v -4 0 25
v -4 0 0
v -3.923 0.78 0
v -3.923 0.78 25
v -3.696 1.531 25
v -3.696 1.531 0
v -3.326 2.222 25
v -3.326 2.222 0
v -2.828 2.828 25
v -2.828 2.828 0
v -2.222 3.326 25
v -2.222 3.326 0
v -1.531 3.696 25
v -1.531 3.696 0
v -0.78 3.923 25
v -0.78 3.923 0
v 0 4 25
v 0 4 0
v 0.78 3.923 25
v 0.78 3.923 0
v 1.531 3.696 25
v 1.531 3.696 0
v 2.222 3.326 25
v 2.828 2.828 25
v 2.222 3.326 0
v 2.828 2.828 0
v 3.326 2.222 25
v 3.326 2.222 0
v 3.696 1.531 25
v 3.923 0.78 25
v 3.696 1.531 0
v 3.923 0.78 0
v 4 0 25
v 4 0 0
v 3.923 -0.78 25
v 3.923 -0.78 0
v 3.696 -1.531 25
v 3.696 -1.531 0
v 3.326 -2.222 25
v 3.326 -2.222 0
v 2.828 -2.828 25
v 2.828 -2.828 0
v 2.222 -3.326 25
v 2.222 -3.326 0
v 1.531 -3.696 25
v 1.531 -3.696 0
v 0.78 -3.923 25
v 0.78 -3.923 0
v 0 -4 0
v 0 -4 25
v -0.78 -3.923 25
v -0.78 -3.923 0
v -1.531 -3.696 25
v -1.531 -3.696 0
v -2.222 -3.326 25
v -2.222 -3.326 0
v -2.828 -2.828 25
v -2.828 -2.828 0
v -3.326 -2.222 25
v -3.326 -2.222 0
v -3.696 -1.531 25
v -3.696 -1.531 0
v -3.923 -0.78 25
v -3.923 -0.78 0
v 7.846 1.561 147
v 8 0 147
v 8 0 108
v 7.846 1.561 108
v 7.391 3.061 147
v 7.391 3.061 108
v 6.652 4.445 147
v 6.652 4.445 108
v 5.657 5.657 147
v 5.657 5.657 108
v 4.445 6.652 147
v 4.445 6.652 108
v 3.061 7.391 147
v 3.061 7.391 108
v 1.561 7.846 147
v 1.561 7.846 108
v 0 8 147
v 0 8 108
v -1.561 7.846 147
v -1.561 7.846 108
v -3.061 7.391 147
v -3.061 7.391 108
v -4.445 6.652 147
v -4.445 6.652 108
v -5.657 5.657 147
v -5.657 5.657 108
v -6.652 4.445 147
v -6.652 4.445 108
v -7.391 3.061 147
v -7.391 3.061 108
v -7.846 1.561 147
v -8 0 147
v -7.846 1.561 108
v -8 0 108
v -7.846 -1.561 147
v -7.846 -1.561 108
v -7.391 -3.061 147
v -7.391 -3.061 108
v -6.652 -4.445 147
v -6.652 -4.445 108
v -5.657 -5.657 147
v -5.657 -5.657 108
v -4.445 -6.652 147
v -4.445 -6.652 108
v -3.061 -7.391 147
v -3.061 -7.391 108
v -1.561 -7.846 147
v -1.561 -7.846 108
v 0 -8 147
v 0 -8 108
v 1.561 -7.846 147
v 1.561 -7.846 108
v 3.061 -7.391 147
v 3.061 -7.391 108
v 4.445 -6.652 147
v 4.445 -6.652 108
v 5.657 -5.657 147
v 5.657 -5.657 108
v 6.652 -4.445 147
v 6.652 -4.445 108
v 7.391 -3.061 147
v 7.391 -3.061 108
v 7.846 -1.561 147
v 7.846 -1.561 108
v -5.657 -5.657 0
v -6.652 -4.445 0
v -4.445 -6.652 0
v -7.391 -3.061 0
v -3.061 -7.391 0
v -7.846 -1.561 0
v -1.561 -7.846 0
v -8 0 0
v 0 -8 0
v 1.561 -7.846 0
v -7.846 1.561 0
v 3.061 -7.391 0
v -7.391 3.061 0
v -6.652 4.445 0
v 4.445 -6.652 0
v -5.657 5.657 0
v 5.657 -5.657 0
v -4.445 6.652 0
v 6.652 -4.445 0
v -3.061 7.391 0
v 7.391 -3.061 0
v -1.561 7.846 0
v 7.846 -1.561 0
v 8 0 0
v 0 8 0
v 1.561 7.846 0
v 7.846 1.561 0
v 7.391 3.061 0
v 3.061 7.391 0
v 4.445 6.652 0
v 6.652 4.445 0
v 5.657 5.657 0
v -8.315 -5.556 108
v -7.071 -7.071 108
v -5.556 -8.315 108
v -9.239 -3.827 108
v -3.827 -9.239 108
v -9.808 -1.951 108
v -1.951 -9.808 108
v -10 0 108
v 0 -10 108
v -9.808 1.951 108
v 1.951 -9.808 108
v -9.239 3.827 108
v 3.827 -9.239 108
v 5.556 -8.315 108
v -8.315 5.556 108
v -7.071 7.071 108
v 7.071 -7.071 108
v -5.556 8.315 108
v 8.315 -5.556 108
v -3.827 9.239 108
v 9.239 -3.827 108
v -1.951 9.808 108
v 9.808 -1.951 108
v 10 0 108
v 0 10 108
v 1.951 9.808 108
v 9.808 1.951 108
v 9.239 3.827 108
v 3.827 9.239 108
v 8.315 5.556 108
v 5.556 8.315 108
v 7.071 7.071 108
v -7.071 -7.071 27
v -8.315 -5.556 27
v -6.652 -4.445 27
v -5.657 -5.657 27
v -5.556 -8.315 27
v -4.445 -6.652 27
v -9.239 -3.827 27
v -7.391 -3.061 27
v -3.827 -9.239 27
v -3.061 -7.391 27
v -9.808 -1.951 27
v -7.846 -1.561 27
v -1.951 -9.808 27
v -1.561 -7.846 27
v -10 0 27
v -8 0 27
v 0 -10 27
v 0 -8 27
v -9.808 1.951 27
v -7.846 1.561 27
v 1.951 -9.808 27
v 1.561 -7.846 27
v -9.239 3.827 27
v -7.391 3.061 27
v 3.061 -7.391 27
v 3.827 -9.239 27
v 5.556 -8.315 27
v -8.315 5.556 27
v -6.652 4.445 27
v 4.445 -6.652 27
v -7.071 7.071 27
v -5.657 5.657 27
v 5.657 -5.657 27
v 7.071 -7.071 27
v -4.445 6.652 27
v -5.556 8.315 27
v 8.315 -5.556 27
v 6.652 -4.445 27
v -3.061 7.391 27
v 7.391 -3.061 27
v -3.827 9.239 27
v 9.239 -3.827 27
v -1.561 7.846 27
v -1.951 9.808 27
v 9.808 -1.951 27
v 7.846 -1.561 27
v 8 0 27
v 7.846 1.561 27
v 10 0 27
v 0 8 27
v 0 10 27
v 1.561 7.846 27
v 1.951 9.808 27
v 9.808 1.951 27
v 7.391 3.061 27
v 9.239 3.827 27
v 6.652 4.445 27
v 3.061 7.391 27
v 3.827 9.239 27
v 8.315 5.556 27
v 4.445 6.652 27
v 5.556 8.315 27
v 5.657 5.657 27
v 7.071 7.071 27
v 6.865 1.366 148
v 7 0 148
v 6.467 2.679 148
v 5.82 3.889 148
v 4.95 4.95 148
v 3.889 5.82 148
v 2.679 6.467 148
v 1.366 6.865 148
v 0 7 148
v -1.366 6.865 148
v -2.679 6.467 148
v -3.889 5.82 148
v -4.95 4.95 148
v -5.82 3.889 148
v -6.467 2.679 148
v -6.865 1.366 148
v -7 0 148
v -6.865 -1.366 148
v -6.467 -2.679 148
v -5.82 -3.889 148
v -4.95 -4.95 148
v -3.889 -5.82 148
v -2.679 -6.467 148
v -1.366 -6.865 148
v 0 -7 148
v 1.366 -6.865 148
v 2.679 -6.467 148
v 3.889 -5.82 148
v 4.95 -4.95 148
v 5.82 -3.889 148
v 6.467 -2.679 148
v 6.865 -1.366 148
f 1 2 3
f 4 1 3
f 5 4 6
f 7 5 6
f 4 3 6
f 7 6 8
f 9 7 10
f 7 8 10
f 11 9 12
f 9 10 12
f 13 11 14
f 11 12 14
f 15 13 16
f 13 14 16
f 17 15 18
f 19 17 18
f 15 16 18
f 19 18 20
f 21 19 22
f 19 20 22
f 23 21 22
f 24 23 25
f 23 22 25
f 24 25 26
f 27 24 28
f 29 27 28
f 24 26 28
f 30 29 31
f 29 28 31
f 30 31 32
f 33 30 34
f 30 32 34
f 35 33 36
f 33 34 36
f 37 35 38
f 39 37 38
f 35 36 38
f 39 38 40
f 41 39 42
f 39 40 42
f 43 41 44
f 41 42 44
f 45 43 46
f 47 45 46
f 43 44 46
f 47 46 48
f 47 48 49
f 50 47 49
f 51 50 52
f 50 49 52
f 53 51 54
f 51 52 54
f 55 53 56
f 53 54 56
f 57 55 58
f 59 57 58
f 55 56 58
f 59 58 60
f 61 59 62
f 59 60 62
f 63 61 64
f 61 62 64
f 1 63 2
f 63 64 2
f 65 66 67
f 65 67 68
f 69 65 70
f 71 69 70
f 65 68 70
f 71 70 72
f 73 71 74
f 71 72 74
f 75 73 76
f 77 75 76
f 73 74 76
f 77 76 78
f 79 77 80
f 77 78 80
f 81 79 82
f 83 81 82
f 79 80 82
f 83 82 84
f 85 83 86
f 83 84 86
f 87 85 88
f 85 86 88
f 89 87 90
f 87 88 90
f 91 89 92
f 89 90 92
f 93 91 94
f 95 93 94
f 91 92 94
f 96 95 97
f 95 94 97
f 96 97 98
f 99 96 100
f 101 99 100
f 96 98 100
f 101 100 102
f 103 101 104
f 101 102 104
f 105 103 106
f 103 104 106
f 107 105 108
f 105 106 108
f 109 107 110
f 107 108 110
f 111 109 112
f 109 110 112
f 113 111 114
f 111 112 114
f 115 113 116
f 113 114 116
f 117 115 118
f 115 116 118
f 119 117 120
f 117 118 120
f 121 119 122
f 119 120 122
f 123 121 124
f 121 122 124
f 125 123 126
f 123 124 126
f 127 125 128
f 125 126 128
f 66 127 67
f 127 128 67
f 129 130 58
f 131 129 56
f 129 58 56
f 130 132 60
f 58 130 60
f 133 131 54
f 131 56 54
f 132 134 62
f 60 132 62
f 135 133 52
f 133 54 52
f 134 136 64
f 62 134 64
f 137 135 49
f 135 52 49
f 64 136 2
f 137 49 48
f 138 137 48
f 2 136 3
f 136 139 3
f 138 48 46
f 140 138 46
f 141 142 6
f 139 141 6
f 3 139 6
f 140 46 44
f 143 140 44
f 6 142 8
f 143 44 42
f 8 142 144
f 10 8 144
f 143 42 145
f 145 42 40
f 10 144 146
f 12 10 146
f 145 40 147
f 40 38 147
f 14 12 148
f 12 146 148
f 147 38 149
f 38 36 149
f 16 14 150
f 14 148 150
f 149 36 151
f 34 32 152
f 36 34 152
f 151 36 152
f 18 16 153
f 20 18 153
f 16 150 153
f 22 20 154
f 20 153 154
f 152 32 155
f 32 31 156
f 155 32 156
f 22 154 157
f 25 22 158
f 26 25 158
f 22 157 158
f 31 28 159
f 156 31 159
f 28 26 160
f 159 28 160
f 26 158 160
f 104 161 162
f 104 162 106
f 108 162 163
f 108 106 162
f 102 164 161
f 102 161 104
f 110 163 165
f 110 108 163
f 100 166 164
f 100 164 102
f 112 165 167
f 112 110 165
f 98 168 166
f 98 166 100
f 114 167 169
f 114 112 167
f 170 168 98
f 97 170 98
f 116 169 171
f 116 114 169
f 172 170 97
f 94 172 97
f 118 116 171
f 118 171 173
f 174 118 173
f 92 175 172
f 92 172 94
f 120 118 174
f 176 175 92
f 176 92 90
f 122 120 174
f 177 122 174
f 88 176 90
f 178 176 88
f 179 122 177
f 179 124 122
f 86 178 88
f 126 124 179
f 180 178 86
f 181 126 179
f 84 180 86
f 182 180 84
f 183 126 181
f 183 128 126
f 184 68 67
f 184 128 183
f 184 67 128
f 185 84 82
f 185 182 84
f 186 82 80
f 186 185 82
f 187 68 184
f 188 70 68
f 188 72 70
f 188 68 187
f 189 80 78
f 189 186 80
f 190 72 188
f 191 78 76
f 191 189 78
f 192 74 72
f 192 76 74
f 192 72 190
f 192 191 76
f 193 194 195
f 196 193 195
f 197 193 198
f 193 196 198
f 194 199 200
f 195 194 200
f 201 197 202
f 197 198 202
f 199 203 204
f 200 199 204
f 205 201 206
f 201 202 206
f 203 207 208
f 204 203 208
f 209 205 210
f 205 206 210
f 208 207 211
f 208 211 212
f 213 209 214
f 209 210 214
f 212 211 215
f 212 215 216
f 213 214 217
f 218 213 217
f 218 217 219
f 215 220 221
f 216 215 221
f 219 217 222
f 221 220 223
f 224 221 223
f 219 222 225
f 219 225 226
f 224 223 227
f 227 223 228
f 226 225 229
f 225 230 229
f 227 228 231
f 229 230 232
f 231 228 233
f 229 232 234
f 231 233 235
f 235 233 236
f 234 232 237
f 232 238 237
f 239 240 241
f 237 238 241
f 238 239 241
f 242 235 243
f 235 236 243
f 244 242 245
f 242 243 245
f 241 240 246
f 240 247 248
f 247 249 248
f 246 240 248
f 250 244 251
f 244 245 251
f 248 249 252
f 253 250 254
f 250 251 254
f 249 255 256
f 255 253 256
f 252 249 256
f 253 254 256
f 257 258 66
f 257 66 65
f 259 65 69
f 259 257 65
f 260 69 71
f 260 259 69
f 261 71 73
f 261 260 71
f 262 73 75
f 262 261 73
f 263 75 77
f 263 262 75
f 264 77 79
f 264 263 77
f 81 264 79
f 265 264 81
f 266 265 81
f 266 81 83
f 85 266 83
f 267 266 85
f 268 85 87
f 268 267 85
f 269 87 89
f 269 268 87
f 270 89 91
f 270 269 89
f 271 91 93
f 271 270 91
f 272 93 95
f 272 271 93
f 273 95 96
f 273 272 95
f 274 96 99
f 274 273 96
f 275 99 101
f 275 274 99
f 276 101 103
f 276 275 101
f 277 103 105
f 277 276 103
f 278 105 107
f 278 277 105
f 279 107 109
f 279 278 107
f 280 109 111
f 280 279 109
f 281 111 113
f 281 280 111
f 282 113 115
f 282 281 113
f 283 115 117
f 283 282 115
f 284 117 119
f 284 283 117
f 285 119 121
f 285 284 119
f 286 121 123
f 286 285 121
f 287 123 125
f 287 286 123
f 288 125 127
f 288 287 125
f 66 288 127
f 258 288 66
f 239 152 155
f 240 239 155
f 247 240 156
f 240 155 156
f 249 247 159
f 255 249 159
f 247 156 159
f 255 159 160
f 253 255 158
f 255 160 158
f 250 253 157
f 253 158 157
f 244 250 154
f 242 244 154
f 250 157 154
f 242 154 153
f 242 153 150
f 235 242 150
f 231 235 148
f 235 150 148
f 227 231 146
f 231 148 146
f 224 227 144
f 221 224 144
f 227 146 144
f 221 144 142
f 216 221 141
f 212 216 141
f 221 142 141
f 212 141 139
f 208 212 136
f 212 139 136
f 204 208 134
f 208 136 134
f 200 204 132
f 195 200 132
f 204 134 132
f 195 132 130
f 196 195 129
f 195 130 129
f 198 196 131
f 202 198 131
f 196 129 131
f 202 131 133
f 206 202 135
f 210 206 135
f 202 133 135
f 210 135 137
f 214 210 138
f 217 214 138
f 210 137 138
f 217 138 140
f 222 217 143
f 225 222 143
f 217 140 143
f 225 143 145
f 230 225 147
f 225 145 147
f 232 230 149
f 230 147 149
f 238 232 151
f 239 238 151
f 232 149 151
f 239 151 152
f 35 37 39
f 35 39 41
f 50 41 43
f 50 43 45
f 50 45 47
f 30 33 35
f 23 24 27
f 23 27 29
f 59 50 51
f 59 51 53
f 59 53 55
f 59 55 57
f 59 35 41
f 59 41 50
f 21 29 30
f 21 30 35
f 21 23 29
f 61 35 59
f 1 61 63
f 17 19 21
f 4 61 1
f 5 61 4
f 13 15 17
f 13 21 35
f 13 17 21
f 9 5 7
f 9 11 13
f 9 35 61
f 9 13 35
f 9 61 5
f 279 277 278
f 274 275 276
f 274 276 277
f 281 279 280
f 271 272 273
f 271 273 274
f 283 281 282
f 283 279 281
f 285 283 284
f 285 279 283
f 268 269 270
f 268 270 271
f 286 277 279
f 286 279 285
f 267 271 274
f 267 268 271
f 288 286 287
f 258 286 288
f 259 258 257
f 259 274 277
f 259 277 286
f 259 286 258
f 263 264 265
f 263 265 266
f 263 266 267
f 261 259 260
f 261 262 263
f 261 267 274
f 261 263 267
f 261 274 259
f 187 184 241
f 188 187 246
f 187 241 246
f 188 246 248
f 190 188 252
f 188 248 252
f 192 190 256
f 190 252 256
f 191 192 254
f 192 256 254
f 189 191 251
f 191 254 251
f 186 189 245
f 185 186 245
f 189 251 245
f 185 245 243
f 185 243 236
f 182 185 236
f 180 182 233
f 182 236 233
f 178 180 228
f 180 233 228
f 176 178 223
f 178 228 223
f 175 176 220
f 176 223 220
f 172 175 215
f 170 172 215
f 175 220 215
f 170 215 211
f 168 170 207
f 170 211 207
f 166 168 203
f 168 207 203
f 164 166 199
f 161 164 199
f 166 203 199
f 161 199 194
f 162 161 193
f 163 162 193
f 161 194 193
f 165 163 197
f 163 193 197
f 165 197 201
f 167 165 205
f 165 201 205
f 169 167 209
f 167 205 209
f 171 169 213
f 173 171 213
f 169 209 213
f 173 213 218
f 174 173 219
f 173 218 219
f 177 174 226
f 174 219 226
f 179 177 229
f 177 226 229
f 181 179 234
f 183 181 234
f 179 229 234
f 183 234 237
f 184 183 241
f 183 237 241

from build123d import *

# Parameters (mm, degrees)
CROQUIS1_R              = 8
SALIENTE_EXTRUIR1_DEPTH = 27
CROQUIS2_R              = 10
SALIENTE_EXTRUIR2_DEPTH = 81
CROQUIS3_R              = 8
SALIENTE_EXTRUIR3_DEPTH = 40
CHAFL_N1_SIZE           = 1
CROQUIS4_R              = 4
CORTAR_EXTRUIR1_DEPTH   = 25


with BuildPart() as part:
    # Croquis1 → Saliente-Extruir1 (new body)
    with BuildSketch(Plane.XY):
        Circle(CROQUIS1_R)
    extrude(amount=SALIENTE_EXTRUIR1_DEPTH)

    # Croquis2 → Saliente-Extruir2 (add)
    with BuildSketch(Plane.XY.offset(27)):
        Circle(CROQUIS2_R)
    extrude(amount=SALIENTE_EXTRUIR2_DEPTH)

    # Croquis3 → Saliente-Extruir3 (add)
    with BuildSketch(Plane.XY.offset(108)):
        Circle(CROQUIS3_R)
    extrude(amount=SALIENTE_EXTRUIR3_DEPTH)

    # Chaflán1
    chafl_n1_edges = [part.edges().sort_by_distance(p)[0] for p in [
        (-8, 0, 148),
    ]]
    chamfer(chafl_n1_edges, length=CHAFL_N1_SIZE)

    # Croquis4 → Cortar-Extruir1 (cut)
    with BuildSketch(Plane(origin=(0, 0, 0), x_dir=(-1, 0, 0), z_dir=(0, 0, -1))):
        Circle(CROQUIS4_R)
    extrude(amount=-CORTAR_EXTRUIR1_DEPTH, mode=Mode.SUBTRACT)


solid = part.part
